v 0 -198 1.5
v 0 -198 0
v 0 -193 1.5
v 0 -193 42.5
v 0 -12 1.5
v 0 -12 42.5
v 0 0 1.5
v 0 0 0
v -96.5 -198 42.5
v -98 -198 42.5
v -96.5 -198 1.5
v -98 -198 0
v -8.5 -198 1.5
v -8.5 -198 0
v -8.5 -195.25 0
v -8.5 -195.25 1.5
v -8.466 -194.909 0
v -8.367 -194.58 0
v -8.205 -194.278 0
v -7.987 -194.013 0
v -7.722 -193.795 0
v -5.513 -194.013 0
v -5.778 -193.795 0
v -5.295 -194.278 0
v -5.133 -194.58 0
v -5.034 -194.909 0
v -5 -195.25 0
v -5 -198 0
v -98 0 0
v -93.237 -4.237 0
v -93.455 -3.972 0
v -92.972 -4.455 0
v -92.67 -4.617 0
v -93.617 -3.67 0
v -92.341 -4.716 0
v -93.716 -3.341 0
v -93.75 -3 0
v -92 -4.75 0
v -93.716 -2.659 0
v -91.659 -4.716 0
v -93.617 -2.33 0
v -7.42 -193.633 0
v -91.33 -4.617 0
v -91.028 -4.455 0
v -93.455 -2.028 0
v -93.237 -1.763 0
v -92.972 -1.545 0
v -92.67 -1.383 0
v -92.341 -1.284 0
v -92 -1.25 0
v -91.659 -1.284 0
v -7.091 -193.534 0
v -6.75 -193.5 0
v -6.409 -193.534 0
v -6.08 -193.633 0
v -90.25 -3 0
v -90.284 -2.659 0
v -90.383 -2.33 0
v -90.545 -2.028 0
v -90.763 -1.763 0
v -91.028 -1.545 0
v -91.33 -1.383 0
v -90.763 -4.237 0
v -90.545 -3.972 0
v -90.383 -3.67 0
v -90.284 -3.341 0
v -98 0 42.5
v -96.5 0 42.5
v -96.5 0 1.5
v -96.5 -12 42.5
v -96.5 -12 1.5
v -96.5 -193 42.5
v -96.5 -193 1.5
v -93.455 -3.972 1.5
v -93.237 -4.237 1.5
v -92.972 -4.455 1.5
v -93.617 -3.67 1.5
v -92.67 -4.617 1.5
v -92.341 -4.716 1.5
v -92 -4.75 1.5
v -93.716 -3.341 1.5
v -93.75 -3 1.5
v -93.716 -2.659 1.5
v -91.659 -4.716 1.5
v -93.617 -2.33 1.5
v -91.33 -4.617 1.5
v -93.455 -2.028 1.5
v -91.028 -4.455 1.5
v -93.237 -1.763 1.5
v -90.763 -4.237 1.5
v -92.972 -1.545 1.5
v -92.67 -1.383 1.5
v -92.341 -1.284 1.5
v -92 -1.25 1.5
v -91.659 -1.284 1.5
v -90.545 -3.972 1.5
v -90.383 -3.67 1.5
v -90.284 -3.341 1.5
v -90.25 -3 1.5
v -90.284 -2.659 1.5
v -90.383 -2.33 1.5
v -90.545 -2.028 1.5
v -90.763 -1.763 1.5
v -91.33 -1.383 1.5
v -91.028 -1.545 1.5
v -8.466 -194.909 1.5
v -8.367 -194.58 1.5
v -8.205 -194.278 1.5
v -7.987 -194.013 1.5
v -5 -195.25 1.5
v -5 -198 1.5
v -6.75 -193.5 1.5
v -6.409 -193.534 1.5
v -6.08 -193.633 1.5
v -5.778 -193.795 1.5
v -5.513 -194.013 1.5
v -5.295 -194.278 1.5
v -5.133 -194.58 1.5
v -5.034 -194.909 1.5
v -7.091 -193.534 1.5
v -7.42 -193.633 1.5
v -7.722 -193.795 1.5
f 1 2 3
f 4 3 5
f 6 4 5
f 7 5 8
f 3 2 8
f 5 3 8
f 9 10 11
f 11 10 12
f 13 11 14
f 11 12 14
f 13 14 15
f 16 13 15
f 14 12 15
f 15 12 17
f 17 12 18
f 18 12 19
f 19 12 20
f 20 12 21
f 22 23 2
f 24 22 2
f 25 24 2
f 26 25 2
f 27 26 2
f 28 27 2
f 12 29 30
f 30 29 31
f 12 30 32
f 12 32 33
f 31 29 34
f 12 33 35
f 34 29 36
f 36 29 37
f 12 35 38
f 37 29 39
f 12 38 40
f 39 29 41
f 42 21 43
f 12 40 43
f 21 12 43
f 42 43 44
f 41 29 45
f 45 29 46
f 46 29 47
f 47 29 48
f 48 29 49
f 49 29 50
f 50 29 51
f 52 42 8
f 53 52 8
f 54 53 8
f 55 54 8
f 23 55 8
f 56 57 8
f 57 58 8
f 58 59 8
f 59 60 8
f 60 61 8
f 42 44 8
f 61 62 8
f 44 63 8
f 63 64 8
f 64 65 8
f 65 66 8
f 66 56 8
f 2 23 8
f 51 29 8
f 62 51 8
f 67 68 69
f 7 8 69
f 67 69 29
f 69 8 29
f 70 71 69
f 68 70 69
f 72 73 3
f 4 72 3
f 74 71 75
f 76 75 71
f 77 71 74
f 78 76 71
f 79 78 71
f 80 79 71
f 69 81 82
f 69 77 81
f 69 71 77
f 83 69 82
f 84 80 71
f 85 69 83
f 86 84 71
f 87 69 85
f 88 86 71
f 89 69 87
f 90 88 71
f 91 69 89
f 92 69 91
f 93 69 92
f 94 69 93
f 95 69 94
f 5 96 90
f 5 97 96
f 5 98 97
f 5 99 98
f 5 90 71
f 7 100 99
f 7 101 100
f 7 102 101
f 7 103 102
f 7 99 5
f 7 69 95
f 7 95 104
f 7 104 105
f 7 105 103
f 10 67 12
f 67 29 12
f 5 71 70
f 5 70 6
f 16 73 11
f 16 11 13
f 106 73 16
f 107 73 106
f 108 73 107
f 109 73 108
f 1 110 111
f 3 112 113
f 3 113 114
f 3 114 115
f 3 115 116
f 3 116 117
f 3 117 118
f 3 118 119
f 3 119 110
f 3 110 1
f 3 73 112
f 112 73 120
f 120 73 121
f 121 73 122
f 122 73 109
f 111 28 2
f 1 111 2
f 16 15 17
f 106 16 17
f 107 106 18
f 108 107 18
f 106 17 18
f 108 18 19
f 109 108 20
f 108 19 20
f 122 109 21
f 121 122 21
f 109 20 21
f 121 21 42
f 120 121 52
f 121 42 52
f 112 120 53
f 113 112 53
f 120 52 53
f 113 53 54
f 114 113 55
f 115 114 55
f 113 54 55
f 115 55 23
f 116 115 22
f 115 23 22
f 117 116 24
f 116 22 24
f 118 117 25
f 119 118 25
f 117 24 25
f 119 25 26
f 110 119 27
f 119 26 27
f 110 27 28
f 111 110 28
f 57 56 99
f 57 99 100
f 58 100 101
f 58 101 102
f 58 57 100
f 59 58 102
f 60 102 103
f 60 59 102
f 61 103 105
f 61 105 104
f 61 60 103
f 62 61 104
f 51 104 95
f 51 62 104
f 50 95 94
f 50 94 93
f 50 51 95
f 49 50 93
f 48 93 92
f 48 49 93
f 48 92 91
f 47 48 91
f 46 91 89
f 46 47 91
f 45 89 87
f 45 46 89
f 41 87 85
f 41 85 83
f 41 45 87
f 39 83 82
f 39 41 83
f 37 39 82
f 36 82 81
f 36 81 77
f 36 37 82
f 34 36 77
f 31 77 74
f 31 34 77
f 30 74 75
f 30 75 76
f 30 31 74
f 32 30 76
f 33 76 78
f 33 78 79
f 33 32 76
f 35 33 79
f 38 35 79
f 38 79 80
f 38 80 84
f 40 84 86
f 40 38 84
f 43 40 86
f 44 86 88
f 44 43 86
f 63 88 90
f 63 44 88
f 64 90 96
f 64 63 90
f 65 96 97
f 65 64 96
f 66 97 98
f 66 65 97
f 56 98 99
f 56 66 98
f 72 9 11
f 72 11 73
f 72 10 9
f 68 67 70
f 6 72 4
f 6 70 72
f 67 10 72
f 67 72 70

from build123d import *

# Parameters (mm, degrees)
ESQUISSE1_R        = 1.75
BOSS_EXTRU_1_DEPTH = 1.5
ESQUISSE2_W        = 96.5
ESQUISSE2_H        = 181
BOSS_EXTRU_2_DEPTH = 41


with BuildPart() as part:
    # Esquisse1 → Boss.-Extru.1 (new body)
    with BuildSketch(Plane.XY):
        with BuildLine():
            ThreePointArc((-8.5, -195.25), (-6.75, -193.5), (-5, -195.25))
            Line((-5, -195.25), (-5, -198))
            Line((-5, -198), (0, -198))
            Line((0, -198), (0, 0))
            Line((0, 0), (-98, 0))
            Line((-98, 0), (-98, -198))
            Line((-98, -198), (-8.5, -198))
            Line((-8.5, -198), (-8.5, -195.25))
        make_face()
        with Locations((-92, -3)):
            Circle(ESQUISSE1_R, mode=Mode.SUBTRACT)
    extrude(amount=BOSS_EXTRU_1_DEPTH)

    # Esquisse2 → Boss.-Extru.2 (add)
    with BuildSketch(Plane.XY.offset(1.5)):
        with Locations((-48.25, -102.5)):
            Rectangle(ESQUISSE2_W, ESQUISSE2_H)
        Polygon((-98, 0), (-98, -198), (-96.5, -198), (-96.5, -193), (-96.5, -12), (-96.5, 0), align=None)
    extrude(amount=BOSS_EXTRU_2_DEPTH)


solid = part.part
